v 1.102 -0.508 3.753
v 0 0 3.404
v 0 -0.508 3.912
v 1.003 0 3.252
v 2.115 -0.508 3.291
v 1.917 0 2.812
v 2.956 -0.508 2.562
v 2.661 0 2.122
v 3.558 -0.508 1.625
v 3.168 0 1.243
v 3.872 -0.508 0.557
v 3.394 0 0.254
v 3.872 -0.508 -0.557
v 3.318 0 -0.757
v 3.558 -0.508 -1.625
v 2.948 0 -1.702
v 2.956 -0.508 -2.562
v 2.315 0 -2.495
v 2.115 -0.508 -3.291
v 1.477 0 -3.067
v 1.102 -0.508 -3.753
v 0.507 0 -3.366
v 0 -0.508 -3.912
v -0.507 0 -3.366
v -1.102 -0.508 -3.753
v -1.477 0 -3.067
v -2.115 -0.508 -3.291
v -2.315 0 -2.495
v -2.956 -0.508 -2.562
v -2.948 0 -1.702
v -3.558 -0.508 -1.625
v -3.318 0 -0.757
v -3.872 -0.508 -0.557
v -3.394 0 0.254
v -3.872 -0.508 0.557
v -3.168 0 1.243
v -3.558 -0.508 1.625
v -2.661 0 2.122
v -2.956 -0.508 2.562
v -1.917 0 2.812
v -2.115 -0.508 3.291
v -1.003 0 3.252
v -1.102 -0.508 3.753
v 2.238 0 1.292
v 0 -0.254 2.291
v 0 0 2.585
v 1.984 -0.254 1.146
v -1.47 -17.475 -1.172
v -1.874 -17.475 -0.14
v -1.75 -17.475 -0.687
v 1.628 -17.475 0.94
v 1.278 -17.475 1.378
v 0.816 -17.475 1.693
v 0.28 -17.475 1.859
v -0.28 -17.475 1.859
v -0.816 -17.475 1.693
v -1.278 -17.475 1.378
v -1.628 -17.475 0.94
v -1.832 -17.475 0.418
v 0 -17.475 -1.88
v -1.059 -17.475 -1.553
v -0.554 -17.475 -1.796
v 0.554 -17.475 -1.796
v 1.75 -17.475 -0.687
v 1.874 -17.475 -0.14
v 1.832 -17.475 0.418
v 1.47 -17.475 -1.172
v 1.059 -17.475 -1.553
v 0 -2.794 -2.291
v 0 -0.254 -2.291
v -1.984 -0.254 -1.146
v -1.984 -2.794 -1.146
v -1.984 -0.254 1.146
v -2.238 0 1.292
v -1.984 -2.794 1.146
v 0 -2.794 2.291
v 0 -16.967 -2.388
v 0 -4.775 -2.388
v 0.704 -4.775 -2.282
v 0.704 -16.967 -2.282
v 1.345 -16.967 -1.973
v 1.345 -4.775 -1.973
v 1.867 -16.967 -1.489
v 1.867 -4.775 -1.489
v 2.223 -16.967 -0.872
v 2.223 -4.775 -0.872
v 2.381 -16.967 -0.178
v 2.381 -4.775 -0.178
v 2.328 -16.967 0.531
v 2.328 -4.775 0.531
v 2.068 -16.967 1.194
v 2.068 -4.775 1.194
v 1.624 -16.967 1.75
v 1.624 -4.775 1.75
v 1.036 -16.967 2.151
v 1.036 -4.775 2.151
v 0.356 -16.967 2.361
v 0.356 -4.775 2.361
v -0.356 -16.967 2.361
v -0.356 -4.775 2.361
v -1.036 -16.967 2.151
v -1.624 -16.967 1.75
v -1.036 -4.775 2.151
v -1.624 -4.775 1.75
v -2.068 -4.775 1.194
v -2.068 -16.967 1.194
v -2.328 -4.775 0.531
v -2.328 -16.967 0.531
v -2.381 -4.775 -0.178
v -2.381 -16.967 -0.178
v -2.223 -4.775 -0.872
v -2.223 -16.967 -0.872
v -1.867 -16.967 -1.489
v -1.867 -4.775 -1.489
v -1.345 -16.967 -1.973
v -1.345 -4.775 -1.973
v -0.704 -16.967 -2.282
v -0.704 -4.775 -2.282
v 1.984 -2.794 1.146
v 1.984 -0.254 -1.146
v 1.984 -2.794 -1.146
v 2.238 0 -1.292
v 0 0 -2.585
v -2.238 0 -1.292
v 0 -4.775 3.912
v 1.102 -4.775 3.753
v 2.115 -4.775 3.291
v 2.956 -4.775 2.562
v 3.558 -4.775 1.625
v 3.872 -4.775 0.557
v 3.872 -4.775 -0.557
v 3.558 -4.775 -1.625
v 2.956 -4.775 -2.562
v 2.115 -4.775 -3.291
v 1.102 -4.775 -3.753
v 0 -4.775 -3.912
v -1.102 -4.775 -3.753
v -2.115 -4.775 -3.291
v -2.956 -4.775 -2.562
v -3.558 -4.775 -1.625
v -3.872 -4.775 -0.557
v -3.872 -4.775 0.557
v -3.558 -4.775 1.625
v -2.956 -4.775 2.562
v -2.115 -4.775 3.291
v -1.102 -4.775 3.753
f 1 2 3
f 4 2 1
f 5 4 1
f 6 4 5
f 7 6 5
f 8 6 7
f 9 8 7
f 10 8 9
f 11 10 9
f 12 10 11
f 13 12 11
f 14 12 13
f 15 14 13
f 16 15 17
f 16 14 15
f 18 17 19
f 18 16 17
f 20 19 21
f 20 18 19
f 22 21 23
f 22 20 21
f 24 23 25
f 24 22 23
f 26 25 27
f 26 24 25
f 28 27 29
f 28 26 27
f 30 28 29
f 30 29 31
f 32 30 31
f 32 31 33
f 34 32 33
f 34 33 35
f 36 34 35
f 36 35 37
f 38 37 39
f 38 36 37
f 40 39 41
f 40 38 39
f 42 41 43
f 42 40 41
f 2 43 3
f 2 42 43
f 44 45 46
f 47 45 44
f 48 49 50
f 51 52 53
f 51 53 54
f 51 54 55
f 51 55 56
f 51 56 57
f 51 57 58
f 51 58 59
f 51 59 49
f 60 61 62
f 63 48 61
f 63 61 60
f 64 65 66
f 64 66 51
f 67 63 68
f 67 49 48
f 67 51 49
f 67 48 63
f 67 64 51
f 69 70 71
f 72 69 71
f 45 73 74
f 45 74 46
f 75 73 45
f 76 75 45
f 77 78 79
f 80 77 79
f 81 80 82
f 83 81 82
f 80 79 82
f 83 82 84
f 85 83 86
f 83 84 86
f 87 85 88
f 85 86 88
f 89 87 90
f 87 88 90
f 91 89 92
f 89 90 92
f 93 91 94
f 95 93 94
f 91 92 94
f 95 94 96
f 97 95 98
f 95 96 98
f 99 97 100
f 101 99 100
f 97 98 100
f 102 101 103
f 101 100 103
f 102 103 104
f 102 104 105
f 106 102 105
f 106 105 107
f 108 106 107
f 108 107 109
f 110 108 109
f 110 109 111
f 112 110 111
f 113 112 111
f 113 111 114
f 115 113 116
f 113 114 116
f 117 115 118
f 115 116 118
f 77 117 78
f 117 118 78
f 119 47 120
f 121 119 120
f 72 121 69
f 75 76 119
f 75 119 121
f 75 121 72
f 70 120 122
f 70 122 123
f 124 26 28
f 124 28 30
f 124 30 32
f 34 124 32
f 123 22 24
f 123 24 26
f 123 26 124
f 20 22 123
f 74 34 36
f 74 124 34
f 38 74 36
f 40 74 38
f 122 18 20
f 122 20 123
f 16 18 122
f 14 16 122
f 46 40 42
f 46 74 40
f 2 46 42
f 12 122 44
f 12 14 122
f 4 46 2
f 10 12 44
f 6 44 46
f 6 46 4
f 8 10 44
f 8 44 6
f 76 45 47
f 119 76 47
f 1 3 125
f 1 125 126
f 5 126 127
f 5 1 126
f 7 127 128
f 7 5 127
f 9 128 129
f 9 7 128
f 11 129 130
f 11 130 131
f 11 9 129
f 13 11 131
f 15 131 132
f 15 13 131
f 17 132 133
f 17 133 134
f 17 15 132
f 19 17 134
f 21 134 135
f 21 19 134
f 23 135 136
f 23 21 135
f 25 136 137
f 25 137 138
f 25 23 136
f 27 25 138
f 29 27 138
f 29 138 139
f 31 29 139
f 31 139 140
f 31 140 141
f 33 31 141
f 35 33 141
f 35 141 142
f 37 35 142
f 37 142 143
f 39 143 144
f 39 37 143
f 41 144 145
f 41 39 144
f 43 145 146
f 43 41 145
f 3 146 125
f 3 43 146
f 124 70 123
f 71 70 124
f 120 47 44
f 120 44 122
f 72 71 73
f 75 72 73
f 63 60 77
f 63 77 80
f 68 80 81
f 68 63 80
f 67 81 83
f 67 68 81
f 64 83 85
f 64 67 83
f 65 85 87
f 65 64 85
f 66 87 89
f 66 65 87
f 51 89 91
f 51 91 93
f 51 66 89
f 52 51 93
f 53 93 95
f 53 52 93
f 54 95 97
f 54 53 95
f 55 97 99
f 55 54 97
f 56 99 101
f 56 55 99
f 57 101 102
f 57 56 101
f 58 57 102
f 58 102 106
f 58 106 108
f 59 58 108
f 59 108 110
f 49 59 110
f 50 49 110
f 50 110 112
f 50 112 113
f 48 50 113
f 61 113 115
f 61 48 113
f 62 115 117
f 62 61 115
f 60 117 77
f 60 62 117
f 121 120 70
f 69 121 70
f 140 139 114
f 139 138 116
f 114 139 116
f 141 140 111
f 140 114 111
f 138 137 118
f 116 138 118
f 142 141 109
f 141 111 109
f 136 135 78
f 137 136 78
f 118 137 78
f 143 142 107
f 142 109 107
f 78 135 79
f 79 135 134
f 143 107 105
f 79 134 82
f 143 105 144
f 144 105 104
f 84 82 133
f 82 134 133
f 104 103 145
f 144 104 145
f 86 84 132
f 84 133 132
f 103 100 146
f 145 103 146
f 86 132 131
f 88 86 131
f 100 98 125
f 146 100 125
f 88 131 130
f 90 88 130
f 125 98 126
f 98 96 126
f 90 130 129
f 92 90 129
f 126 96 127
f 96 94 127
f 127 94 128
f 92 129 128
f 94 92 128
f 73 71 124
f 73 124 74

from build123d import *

# Parameters (mm, degrees)
SKETCH1_W           = 3.9116
SKETCH1_H           = 4.7752
SKETCH2_R           = 2.3876
BOSS_EXTRUDE1_DEPTH = 12.7
CUT_EXTRUDE1_DEPTH  = 2.794
CHAMFER1_SIZE       = 0.508
CHAMFER2_SIZE       = 0.254


with BuildPart() as part:
    # Sketch1 → Revolve1 (revolve)
    with BuildSketch(Plane.XY, mode=Mode.PRIVATE) as revolve1_sk:
        with Locations((-1.9558, -2.3876)):
            Rectangle(SKETCH1_W, SKETCH1_H)
    revolve(revolve1_sk.sketch.rotate(Axis((0, -4.7752, 0), (0, 1, 0)), 90), axis=Axis((0, -4.7752, 0), (0, 1, 0)))

    # Sketch2 → Boss-Extrude1 (add)
    with BuildSketch(Plane.XZ.offset(4.7752)):
        with Locations(Location((0, 0, 0), (0, 0, 270))):
            Circle(SKETCH2_R)
    extrude(amount=BOSS_EXTRUDE1_DEPTH)

    # Sketch3 → Cut-Extrude1 (cut)
    with BuildSketch(Plane(origin=(0, 0, 0), x_dir=(-1, 0, 0), z_dir=(0, 1, 0))):
        Polygon((1.984374999, -1.14567944), (1.984374999, 1.14567944), (0, 2.29135888), (-1.984374999, 1.14567944), (-1.984374999, -1.14567944), (0, -2.29135888), align=None)
    extrude(amount=-CUT_EXTRUDE1_DEPTH, mode=Mode.SUBTRACT)

    # Chamfer1
    chamfer1_edges = [part.edges().sort_by_distance(p)[0] for p in [
        (0, 0, -3.9116),
        (0, -17.4752, 2.3876),
    ]]
    chamfer(chamfer1_edges, length=CHAMFER1_SIZE)

    # Chamfer2
    chamfer2_edges = [part.edges().sort_by_distance(p)[0] for p in [
        (-0.9921875, 0, -1.71851916),
        (-1.984374999, 0, 0),
        (-0.9921875, 0, 1.71851916),
        (0.9921875, 0, 1.71851916),
        (1.984374999, 0, 0),
        (0.9921875, 0, -1.71851916),
    ]]
    chamfer(chamfer2_edges, length=CHAMFER2_SIZE)


solid = part.part
